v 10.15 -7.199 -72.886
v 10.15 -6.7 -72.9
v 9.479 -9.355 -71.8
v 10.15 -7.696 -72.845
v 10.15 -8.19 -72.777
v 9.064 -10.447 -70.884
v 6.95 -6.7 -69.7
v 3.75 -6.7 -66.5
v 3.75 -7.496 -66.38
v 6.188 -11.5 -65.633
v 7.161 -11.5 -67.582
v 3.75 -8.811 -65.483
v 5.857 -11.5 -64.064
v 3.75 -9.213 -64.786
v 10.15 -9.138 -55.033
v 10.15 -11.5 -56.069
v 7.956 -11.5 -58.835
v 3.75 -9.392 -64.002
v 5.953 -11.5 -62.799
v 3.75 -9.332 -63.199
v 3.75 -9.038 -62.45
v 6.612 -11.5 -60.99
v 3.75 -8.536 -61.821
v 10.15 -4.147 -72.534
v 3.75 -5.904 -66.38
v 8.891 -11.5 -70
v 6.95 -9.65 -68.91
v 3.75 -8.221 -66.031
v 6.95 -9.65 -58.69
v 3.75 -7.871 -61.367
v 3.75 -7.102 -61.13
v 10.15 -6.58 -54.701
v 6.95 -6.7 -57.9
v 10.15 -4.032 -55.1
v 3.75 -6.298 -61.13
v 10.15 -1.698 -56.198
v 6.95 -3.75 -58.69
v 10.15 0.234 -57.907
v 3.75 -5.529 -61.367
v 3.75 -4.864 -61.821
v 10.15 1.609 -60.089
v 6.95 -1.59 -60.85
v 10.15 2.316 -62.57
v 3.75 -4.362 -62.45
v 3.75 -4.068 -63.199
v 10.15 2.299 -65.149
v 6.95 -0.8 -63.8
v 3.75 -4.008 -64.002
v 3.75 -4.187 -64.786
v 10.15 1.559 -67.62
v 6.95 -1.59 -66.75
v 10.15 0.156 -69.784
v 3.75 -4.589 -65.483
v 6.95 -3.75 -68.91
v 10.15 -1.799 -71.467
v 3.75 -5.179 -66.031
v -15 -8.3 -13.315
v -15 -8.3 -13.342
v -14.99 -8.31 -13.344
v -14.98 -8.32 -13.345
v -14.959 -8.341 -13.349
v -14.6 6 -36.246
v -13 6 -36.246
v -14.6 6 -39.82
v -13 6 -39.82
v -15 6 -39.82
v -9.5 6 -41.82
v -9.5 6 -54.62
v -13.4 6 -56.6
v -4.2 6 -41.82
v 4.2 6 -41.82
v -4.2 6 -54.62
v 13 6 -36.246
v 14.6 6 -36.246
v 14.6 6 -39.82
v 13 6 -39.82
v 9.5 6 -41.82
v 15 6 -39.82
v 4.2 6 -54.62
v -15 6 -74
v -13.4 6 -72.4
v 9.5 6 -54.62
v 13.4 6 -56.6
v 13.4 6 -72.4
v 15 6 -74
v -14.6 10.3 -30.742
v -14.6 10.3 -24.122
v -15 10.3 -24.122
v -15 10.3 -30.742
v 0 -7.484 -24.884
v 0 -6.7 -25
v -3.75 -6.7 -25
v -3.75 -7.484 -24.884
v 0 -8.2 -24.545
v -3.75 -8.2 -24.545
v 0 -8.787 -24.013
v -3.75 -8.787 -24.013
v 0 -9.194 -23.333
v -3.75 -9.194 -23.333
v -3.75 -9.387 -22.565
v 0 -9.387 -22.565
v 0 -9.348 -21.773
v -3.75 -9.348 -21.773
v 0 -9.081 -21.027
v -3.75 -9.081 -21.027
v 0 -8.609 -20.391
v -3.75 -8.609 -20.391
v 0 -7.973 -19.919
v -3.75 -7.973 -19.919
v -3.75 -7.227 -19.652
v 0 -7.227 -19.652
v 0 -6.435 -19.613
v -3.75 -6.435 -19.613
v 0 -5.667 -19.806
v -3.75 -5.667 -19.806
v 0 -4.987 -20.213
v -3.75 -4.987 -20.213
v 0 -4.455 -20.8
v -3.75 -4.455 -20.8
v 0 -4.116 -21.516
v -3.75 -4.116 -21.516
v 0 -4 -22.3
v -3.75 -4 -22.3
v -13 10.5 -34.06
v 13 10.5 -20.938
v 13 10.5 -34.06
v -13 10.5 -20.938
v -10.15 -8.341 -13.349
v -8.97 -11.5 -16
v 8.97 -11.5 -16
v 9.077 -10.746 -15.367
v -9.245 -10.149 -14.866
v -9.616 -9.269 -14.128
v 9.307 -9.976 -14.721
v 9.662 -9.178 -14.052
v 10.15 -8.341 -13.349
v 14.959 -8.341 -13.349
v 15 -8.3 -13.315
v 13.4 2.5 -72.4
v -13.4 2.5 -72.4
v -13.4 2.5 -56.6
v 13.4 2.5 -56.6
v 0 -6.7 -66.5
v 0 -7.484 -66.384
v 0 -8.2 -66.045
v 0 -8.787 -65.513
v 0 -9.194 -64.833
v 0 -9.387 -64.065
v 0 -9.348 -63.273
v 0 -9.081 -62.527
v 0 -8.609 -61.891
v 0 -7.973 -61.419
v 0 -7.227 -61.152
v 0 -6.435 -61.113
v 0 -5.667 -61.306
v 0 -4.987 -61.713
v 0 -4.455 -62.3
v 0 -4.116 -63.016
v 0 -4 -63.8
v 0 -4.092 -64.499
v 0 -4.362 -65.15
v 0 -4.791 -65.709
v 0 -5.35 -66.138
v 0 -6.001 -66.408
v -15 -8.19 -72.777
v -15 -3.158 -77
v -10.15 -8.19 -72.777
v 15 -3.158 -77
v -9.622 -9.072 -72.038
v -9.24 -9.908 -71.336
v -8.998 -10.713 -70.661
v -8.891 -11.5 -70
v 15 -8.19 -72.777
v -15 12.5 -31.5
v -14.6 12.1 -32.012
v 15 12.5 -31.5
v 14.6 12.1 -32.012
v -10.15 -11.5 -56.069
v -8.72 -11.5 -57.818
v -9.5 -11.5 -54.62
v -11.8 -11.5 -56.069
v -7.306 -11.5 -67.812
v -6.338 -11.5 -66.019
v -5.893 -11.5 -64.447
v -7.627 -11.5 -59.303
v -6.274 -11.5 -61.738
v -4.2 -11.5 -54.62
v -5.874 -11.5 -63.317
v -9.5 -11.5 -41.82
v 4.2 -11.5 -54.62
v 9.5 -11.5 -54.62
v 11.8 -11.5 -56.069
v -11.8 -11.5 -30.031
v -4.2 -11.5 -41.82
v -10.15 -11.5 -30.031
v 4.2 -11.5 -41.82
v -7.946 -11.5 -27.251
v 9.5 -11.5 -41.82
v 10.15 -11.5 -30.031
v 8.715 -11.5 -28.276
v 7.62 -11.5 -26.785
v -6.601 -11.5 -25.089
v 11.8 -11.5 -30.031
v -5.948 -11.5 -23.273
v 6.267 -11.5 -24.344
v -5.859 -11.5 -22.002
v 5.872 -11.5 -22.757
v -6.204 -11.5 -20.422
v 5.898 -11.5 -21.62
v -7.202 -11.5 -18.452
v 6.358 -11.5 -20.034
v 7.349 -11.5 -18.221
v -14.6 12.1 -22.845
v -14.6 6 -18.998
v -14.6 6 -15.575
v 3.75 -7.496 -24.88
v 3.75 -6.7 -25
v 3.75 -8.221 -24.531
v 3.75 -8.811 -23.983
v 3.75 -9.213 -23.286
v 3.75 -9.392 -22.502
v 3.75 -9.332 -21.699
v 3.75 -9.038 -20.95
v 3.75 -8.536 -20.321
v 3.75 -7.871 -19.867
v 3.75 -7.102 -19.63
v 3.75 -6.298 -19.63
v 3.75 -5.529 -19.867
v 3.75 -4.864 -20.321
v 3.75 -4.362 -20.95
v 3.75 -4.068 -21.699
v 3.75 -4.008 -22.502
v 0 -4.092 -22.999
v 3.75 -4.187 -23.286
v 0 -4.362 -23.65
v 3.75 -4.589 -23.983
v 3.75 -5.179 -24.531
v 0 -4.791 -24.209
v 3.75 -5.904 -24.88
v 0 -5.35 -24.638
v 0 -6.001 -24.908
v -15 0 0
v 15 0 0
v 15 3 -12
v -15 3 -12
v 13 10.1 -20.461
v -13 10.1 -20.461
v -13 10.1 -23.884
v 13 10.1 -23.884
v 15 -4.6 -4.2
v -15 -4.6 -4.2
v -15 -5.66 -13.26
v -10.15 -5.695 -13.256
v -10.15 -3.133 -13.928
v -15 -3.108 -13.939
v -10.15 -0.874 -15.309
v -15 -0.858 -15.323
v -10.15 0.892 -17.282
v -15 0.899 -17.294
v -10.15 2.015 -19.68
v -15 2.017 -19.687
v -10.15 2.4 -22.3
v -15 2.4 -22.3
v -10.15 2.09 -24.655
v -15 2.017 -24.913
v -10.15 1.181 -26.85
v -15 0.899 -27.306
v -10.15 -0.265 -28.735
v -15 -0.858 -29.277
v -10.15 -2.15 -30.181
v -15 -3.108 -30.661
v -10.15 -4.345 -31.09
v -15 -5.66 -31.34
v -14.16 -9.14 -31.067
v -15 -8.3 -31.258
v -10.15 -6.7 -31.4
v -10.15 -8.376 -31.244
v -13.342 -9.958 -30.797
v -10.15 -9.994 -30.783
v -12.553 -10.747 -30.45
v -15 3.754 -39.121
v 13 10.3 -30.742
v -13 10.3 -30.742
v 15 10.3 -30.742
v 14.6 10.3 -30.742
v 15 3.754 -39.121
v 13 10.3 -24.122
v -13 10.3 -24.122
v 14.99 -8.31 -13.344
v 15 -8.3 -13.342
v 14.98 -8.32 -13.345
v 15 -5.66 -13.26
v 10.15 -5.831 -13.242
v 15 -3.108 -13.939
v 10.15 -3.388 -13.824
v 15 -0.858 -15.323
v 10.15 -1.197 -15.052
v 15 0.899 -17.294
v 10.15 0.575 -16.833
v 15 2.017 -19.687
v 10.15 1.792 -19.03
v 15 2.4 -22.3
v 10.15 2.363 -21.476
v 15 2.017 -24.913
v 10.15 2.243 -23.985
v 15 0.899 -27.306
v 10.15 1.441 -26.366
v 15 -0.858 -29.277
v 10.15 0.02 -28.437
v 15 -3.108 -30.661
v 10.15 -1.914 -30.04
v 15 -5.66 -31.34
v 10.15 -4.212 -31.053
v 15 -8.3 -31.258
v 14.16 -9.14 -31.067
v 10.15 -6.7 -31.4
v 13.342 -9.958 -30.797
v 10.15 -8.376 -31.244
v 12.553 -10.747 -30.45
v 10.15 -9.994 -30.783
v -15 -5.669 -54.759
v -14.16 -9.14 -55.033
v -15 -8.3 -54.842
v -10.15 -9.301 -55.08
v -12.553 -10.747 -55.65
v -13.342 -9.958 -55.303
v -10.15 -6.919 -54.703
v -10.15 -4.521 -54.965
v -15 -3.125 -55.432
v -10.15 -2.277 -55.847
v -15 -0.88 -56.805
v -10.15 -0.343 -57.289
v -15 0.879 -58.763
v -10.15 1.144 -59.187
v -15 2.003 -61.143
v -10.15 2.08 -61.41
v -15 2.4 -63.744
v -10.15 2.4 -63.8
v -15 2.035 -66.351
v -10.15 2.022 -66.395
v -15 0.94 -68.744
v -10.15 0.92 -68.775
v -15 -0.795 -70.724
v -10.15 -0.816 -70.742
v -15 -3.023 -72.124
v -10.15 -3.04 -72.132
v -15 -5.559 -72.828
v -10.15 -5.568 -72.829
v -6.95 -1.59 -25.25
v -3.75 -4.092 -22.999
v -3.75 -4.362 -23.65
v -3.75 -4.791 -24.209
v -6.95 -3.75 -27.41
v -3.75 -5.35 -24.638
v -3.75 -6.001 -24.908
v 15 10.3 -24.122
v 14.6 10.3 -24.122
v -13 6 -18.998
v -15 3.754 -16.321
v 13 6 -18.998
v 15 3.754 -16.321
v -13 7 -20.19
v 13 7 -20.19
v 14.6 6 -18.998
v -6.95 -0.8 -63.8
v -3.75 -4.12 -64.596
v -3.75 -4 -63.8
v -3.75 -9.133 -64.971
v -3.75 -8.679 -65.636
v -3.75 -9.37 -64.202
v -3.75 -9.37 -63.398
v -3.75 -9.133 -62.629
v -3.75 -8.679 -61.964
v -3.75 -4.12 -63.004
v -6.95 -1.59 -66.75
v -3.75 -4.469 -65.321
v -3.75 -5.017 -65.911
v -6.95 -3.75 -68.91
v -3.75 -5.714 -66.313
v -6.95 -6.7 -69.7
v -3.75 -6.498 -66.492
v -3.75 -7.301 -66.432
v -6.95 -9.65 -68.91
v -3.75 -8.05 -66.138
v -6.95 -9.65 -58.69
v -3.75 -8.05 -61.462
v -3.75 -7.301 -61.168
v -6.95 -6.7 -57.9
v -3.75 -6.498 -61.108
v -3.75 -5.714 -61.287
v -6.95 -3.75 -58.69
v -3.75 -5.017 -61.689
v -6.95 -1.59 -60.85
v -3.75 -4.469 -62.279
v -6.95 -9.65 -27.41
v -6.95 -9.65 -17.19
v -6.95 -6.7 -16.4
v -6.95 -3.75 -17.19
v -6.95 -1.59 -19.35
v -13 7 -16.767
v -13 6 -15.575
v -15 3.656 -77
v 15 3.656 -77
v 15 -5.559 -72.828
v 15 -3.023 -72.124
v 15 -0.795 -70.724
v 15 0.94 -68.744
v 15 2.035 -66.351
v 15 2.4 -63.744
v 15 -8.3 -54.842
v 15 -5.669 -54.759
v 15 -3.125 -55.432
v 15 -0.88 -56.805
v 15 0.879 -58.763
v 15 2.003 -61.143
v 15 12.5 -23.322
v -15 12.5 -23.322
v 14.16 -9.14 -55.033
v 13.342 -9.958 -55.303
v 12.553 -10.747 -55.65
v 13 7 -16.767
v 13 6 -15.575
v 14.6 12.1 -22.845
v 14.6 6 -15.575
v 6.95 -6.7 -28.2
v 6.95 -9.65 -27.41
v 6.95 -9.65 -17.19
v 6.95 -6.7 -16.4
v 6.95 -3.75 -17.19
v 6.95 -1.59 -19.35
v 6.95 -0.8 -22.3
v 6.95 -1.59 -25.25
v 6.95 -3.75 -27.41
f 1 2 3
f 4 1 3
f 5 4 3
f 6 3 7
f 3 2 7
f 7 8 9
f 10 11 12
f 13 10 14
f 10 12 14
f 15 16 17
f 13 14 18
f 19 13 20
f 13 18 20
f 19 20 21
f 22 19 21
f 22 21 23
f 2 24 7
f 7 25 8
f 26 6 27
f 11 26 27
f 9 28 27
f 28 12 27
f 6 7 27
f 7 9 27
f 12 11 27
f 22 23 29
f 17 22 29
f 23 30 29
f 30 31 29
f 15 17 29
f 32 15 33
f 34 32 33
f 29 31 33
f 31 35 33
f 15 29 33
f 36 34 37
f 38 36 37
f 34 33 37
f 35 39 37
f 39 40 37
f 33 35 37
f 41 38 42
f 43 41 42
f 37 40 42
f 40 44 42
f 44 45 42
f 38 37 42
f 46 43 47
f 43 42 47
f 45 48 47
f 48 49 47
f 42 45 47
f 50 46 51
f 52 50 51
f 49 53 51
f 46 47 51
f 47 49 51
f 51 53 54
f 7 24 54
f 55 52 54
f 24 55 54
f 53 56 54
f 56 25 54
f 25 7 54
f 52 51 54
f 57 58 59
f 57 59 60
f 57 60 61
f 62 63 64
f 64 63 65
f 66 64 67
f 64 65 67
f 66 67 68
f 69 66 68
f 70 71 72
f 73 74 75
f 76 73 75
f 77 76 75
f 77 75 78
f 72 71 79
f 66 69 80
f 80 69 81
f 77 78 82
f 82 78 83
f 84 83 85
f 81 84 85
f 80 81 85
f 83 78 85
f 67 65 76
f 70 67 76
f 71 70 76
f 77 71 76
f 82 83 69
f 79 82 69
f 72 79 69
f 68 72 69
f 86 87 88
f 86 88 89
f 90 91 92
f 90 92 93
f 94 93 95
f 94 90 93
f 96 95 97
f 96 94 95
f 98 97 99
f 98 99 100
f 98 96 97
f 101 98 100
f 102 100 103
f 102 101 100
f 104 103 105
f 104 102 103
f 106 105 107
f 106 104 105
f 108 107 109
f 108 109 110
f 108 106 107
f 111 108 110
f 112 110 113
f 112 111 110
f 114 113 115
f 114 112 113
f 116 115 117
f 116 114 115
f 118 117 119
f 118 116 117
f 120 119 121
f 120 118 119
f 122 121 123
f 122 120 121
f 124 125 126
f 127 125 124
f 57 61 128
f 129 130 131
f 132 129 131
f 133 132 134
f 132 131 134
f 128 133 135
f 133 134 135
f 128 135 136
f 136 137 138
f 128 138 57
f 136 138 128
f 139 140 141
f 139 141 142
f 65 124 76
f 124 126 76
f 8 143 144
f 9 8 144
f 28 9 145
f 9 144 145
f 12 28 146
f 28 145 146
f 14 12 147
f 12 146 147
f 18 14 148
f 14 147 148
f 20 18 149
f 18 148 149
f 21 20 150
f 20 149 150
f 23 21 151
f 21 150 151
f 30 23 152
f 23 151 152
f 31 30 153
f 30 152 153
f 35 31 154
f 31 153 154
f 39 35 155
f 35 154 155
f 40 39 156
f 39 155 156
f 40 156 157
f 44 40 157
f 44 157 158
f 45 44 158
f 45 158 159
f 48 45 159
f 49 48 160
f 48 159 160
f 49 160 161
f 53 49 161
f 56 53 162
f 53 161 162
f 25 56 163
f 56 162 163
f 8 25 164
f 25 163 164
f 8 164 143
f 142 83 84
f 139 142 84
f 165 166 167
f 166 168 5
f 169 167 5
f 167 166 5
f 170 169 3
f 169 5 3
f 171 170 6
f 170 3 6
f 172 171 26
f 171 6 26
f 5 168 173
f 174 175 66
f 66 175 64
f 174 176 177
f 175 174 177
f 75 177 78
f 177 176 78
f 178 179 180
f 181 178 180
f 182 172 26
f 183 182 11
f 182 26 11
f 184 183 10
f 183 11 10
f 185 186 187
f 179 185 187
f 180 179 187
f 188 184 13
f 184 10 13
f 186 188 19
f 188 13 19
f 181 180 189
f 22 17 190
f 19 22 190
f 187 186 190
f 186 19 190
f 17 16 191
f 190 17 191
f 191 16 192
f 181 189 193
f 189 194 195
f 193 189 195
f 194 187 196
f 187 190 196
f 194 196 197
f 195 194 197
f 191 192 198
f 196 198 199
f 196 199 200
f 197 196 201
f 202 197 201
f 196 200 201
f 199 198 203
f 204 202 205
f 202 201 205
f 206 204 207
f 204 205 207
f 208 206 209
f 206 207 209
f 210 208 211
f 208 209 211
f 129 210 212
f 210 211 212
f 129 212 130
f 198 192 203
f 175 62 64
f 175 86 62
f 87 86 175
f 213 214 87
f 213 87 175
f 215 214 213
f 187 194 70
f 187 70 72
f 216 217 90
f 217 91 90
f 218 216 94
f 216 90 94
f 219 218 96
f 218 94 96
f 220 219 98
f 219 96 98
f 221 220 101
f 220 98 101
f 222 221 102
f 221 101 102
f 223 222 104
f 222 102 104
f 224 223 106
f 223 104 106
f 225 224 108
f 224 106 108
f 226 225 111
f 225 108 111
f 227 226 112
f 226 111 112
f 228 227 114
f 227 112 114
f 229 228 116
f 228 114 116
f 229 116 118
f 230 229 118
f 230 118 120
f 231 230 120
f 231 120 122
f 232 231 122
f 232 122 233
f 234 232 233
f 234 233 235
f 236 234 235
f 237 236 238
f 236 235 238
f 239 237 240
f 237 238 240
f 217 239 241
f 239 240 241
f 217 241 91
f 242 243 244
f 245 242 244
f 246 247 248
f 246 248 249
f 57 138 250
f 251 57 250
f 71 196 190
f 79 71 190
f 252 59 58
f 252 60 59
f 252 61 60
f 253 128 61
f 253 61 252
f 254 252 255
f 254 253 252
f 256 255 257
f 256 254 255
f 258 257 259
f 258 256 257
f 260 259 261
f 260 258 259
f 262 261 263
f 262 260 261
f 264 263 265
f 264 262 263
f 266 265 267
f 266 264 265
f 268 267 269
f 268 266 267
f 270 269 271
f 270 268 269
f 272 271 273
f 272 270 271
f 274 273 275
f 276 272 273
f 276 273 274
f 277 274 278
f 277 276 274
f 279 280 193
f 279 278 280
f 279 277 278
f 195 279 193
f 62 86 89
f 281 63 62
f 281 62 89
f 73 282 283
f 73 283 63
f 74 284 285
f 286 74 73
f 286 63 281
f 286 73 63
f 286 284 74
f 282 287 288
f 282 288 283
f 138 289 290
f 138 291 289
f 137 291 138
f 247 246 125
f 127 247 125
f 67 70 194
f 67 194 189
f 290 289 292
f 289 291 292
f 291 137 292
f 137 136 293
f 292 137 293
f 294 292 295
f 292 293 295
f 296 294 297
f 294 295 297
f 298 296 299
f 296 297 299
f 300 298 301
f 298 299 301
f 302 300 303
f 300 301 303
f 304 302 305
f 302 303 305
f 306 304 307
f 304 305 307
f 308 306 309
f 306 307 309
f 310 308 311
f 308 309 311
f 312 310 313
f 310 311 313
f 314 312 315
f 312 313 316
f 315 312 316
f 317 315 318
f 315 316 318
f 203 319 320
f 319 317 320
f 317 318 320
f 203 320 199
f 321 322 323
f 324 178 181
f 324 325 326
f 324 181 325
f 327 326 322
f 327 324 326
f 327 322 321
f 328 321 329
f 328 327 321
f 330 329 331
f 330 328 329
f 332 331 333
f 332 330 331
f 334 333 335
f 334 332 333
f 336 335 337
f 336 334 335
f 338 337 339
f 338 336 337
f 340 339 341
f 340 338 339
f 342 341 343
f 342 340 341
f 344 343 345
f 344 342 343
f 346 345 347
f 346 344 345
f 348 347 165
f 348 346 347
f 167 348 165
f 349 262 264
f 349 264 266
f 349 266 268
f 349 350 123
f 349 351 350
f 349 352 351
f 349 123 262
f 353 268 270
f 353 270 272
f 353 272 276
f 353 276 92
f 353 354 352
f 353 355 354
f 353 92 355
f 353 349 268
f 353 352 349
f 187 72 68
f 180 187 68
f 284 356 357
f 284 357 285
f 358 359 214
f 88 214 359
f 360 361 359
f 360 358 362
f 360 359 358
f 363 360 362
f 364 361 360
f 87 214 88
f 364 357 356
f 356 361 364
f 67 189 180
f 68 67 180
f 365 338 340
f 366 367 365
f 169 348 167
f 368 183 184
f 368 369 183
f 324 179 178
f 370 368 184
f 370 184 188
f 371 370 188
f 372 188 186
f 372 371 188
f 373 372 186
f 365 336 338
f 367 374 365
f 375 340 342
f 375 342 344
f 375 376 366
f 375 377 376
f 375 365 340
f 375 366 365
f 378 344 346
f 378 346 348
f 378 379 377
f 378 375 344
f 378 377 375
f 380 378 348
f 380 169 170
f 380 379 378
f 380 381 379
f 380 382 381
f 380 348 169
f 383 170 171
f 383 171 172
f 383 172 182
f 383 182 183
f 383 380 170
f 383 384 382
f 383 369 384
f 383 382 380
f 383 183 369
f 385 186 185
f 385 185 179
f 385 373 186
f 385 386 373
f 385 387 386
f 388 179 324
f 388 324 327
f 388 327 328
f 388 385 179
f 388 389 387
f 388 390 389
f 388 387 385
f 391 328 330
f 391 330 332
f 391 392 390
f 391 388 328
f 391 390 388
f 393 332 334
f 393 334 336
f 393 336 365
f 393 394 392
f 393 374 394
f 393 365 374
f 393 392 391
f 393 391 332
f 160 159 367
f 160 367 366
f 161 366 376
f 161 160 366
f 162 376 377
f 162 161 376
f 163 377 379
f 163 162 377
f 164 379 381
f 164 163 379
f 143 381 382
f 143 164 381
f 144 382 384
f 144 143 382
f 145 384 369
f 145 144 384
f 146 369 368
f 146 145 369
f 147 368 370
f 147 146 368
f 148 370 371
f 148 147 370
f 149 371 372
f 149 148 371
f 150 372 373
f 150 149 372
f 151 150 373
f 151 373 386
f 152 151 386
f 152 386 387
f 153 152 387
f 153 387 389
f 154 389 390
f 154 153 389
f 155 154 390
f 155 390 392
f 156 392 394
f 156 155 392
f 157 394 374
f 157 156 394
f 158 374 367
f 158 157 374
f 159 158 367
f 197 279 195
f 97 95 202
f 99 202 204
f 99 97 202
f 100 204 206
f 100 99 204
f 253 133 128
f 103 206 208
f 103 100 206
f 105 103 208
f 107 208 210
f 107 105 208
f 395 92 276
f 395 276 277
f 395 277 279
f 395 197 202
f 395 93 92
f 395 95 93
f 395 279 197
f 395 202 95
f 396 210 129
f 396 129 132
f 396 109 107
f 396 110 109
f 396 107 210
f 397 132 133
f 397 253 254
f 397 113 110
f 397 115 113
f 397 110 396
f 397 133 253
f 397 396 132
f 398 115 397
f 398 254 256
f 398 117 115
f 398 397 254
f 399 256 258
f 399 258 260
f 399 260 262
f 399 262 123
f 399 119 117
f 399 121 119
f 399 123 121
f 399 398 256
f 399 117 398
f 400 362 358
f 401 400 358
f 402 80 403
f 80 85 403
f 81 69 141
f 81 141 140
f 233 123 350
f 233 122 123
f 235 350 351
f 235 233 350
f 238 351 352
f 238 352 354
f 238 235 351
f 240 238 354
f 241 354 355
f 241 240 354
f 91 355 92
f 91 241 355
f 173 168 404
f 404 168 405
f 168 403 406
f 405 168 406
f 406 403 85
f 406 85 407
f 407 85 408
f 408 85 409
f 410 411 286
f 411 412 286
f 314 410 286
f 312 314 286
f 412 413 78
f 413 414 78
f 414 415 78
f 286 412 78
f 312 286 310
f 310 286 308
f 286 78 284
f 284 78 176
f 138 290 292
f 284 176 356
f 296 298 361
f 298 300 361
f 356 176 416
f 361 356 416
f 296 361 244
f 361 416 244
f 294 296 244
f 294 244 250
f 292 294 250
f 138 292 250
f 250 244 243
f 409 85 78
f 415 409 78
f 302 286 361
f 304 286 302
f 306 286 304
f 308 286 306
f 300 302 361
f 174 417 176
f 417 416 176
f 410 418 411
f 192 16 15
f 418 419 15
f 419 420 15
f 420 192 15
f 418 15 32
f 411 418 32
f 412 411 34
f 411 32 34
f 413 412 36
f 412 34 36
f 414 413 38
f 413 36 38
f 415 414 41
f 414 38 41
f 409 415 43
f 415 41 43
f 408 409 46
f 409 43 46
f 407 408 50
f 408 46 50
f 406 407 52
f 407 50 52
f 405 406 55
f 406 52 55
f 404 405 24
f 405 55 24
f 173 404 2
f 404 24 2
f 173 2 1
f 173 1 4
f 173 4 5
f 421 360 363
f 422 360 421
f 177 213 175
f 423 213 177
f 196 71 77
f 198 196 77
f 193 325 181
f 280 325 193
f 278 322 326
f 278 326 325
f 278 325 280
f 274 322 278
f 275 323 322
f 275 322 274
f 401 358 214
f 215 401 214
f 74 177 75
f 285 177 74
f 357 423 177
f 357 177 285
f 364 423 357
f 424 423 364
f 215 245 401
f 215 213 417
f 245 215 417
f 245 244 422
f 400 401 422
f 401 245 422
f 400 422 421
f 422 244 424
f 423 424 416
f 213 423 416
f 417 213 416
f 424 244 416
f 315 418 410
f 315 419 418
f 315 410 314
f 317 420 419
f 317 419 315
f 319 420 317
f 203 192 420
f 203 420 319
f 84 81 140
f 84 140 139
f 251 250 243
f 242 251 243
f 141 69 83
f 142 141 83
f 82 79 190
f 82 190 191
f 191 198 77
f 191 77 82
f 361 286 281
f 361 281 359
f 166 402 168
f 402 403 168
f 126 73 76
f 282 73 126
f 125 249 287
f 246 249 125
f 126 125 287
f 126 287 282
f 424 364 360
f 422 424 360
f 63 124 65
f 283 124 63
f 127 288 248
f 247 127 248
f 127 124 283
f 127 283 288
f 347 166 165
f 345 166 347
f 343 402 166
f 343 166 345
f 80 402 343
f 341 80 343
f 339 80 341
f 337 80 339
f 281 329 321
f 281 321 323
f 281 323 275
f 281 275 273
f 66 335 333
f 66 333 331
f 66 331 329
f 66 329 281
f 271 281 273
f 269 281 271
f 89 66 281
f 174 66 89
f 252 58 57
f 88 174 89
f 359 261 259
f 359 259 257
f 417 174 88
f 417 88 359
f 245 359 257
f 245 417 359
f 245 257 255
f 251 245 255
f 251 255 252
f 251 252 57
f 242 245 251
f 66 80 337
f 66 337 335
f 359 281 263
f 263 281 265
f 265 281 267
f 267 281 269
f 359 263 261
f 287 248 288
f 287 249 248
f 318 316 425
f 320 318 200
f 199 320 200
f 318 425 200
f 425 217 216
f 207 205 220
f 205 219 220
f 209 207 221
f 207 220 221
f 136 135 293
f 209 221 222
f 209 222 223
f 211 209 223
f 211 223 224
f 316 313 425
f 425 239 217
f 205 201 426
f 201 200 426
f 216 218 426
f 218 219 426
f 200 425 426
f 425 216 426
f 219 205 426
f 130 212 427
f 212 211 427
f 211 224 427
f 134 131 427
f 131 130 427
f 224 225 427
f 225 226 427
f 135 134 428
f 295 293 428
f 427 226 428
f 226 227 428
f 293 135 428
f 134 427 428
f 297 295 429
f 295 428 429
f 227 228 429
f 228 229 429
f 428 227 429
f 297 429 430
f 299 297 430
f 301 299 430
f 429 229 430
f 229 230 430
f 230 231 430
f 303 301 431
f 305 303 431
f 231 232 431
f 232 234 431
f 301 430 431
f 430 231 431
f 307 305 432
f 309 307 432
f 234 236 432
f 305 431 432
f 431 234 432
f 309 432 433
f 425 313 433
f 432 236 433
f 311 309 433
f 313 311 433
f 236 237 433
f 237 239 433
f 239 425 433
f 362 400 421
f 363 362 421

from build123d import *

# Parameters (mm, degrees)
BOSS_EXTRUDE1_DEPTH      = 15
CHAMFER1_SIZE            = 3.2
LPATTERN1_COUNT          = 2
LPATTERN1_PITCH          = 41.5
SKETCH4_W                = 5.3
SKETCH4_H                = 12.8
CUT_EXTRUDE1_DEPTH       = 81.375680401
SKETCH5_W                = 26.8
SKETCH5_H                = 15.8
CUT_EXTRUDE2_DEPTH       = 3.5
CUT_EXTRUDE_THIN11_REACH = 81.437
SKETCH6_W                = 26
SKETCH6_H                = 1.6


with BuildPart() as part:
    # Sketch1 → Boss-Extrude1 (new, symmetric)
    with BuildSketch(Plane(origin=(0, 0, 0), x_dir=(0, 0, -1), z_dir=(1, 0, 0))):
        Polygon((0, 0), (12, 3), (23.32165913, 12.5), (31.5, 12.5), (39.819620609, 6), (74, 6), (77, 3.65614312), (77, -3.157724852), (70, -11.5), (16, -11.5), (13.31488118, -8.3), (4.2, -4.6), align=None)
        Polygon((16.321122645, 3.753956381), (24.122393645, 10.3), (30.742479251, 10.3), (39.121033004, 3.753956381), align=None, mode=Mode.SUBTRACT)
    extrude(amount=BOSS_EXTRUDE1_DEPTH, both=True)

    # Chamfer1
    chamfer1_edges = [part.edges().sort_by_distance(p)[0] for p in [
        (-15, -11.5, -43),
        (15, -11.5, -43),
    ]]
    chamfer(chamfer1_edges, length=CHAMFER1_SIZE)

    # Sketch2 → Cut-Revolve1 (revolve, cut)
    with BuildSketch(Plane.XY.offset(-22.3)):
        Polygon((15, 2.4), (10.15, 2.4), (3.75, -4), (0, -4), (0, -6.7), (15, -6.7), align=None)
    cut_revolve1 = revolve(axis=Axis((0, -6.7, -22.3), (-1, 0, 0)), mode=Mode.SUBTRACT)

    # Mirror1: Cut-Revolve1 across plane
    add(cut_revolve1.mirror(Plane(origin=(0, 0, 0), x_dir=(0, 0, 1), z_dir=(1, 0, 0))), mode=Mode.SUBTRACT)

    # LPattern1: Cut-Revolve1 ×2
    with Locations(*[(0, 0, -i * LPATTERN1_PITCH) for i in range(1, LPATTERN1_COUNT)]):
        add(cut_revolve1, mode=Mode.SUBTRACT)

    # Mirror2 copy 1 sketch → Mirror2 copy 1 (revolve, cut)
    with BuildSketch(Plane(origin=(0, 0, -63.8), x_dir=(-1, 0, 0), z_dir=(0, 0, 1))):
        Polygon((15, -2.4), (10.15, -2.4), (3.75, 4), (0, 4), (0, 6.7), (15, 6.7), align=None)
    revolve(axis=Axis((0, -6.7, -63.8), (-1, 0, 0)), mode=Mode.SUBTRACT)

    # Mirror2 copy 2 sketch → Mirror2 copy 2 (revolve, cut)
    with BuildSketch(Plane(origin=(0, 0, -22.3), x_dir=(-1, 0, 0), z_dir=(0, 0, 1))):
        Polygon((15, -2.4), (10.15, -2.4), (3.75, 4), (0, 4), (0, 6.7), (15, 6.7), align=None)
    revolve(axis=Axis((0, -6.7, -22.3), (-1, 0, 0)), mode=Mode.SUBTRACT)

    # Sketch4 → Cut-Extrude1 (cut, through all)
    with BuildSketch(Plane(origin=(0, 6, 0), x_dir=(1, 0, 0), z_dir=(0, 1, 0))):
        with Locations((6.85, 48.219620609)):
            Rectangle(SKETCH4_W, SKETCH4_H)
    cut_extrude1 = extrude(amount=-CUT_EXTRUDE1_DEPTH, mode=Mode.SUBTRACT)

    # Mirror3: Cut-Extrude1 across plane
    add(cut_extrude1.mirror(Plane(origin=(0, 0, 0), x_dir=(0, 0, 1), z_dir=(1, 0, 0))), mode=Mode.SUBTRACT)

    # Sketch5 → Cut-Extrude2 (cut)
    with BuildSketch(Plane(origin=(0, 6, 0), x_dir=(1, 0, 0), z_dir=(0, 1, 0))):
        with Locations((0, 64.5)):
            Rectangle(SKETCH5_W, SKETCH5_H)
    extrude(amount=-CUT_EXTRUDE2_DEPTH, mode=Mode.SUBTRACT)

    # Sketch6 → Cut-Extrude-Thin11 (cut, up to next)
    with BuildSketch(Plane.XY, mode=Mode.PRIVATE) as cut_extrude_thin11_sk1:
        with Locations((0, 7.8)):
            Rectangle(SKETCH6_W, SKETCH6_H)
    cut_extrude_thin11_tool1 = extrude(cut_extrude_thin11_sk1.sketch, amount=-CUT_EXTRUDE_THIN11_REACH, mode=Mode.PRIVATE) & part.part
    # Sketch6 → Cut-Extrude-Thin11 (cut, up to next)
    with BuildSketch(Plane.XY, mode=Mode.PRIVATE) as cut_extrude_thin11_sk2:
        Polygon((13, 6), (13, 10.5), (-13, 10.5), (-13, 6), (-14.6, 6), (-14.6, 12.1), (14.6, 12.1), (14.6, 6), align=None)
    cut_extrude_thin11_tool2 = extrude(cut_extrude_thin11_sk2.sketch, amount=-CUT_EXTRUDE_THIN11_REACH, mode=Mode.PRIVATE) & part.part
    # Sketch6 → Cut-Extrude-Thin11 (cut, up to next)
    with BuildSketch(Plane.XY, mode=Mode.PRIVATE) as cut_extrude_thin11_sk3:
        with Locations((0, 9.3)):
            Rectangle(SKETCH6_W, SKETCH6_H)
    cut_extrude_thin11_tool3 = extrude(cut_extrude_thin11_sk3.sketch, amount=-CUT_EXTRUDE_THIN11_REACH, mode=Mode.PRIVATE) & part.part
    add(cut_extrude_thin11_tool1.solids().sort_by_distance((0, 7.8, 0))[0], mode=Mode.SUBTRACT)
    add(cut_extrude_thin11_tool2.solids().sort_by_distance((0, 10.581414, 0))[0], mode=Mode.SUBTRACT)
    add(cut_extrude_thin11_tool3.solids().sort_by_distance((0, 9.3, 0))[0], mode=Mode.SUBTRACT)


solid = part.part
